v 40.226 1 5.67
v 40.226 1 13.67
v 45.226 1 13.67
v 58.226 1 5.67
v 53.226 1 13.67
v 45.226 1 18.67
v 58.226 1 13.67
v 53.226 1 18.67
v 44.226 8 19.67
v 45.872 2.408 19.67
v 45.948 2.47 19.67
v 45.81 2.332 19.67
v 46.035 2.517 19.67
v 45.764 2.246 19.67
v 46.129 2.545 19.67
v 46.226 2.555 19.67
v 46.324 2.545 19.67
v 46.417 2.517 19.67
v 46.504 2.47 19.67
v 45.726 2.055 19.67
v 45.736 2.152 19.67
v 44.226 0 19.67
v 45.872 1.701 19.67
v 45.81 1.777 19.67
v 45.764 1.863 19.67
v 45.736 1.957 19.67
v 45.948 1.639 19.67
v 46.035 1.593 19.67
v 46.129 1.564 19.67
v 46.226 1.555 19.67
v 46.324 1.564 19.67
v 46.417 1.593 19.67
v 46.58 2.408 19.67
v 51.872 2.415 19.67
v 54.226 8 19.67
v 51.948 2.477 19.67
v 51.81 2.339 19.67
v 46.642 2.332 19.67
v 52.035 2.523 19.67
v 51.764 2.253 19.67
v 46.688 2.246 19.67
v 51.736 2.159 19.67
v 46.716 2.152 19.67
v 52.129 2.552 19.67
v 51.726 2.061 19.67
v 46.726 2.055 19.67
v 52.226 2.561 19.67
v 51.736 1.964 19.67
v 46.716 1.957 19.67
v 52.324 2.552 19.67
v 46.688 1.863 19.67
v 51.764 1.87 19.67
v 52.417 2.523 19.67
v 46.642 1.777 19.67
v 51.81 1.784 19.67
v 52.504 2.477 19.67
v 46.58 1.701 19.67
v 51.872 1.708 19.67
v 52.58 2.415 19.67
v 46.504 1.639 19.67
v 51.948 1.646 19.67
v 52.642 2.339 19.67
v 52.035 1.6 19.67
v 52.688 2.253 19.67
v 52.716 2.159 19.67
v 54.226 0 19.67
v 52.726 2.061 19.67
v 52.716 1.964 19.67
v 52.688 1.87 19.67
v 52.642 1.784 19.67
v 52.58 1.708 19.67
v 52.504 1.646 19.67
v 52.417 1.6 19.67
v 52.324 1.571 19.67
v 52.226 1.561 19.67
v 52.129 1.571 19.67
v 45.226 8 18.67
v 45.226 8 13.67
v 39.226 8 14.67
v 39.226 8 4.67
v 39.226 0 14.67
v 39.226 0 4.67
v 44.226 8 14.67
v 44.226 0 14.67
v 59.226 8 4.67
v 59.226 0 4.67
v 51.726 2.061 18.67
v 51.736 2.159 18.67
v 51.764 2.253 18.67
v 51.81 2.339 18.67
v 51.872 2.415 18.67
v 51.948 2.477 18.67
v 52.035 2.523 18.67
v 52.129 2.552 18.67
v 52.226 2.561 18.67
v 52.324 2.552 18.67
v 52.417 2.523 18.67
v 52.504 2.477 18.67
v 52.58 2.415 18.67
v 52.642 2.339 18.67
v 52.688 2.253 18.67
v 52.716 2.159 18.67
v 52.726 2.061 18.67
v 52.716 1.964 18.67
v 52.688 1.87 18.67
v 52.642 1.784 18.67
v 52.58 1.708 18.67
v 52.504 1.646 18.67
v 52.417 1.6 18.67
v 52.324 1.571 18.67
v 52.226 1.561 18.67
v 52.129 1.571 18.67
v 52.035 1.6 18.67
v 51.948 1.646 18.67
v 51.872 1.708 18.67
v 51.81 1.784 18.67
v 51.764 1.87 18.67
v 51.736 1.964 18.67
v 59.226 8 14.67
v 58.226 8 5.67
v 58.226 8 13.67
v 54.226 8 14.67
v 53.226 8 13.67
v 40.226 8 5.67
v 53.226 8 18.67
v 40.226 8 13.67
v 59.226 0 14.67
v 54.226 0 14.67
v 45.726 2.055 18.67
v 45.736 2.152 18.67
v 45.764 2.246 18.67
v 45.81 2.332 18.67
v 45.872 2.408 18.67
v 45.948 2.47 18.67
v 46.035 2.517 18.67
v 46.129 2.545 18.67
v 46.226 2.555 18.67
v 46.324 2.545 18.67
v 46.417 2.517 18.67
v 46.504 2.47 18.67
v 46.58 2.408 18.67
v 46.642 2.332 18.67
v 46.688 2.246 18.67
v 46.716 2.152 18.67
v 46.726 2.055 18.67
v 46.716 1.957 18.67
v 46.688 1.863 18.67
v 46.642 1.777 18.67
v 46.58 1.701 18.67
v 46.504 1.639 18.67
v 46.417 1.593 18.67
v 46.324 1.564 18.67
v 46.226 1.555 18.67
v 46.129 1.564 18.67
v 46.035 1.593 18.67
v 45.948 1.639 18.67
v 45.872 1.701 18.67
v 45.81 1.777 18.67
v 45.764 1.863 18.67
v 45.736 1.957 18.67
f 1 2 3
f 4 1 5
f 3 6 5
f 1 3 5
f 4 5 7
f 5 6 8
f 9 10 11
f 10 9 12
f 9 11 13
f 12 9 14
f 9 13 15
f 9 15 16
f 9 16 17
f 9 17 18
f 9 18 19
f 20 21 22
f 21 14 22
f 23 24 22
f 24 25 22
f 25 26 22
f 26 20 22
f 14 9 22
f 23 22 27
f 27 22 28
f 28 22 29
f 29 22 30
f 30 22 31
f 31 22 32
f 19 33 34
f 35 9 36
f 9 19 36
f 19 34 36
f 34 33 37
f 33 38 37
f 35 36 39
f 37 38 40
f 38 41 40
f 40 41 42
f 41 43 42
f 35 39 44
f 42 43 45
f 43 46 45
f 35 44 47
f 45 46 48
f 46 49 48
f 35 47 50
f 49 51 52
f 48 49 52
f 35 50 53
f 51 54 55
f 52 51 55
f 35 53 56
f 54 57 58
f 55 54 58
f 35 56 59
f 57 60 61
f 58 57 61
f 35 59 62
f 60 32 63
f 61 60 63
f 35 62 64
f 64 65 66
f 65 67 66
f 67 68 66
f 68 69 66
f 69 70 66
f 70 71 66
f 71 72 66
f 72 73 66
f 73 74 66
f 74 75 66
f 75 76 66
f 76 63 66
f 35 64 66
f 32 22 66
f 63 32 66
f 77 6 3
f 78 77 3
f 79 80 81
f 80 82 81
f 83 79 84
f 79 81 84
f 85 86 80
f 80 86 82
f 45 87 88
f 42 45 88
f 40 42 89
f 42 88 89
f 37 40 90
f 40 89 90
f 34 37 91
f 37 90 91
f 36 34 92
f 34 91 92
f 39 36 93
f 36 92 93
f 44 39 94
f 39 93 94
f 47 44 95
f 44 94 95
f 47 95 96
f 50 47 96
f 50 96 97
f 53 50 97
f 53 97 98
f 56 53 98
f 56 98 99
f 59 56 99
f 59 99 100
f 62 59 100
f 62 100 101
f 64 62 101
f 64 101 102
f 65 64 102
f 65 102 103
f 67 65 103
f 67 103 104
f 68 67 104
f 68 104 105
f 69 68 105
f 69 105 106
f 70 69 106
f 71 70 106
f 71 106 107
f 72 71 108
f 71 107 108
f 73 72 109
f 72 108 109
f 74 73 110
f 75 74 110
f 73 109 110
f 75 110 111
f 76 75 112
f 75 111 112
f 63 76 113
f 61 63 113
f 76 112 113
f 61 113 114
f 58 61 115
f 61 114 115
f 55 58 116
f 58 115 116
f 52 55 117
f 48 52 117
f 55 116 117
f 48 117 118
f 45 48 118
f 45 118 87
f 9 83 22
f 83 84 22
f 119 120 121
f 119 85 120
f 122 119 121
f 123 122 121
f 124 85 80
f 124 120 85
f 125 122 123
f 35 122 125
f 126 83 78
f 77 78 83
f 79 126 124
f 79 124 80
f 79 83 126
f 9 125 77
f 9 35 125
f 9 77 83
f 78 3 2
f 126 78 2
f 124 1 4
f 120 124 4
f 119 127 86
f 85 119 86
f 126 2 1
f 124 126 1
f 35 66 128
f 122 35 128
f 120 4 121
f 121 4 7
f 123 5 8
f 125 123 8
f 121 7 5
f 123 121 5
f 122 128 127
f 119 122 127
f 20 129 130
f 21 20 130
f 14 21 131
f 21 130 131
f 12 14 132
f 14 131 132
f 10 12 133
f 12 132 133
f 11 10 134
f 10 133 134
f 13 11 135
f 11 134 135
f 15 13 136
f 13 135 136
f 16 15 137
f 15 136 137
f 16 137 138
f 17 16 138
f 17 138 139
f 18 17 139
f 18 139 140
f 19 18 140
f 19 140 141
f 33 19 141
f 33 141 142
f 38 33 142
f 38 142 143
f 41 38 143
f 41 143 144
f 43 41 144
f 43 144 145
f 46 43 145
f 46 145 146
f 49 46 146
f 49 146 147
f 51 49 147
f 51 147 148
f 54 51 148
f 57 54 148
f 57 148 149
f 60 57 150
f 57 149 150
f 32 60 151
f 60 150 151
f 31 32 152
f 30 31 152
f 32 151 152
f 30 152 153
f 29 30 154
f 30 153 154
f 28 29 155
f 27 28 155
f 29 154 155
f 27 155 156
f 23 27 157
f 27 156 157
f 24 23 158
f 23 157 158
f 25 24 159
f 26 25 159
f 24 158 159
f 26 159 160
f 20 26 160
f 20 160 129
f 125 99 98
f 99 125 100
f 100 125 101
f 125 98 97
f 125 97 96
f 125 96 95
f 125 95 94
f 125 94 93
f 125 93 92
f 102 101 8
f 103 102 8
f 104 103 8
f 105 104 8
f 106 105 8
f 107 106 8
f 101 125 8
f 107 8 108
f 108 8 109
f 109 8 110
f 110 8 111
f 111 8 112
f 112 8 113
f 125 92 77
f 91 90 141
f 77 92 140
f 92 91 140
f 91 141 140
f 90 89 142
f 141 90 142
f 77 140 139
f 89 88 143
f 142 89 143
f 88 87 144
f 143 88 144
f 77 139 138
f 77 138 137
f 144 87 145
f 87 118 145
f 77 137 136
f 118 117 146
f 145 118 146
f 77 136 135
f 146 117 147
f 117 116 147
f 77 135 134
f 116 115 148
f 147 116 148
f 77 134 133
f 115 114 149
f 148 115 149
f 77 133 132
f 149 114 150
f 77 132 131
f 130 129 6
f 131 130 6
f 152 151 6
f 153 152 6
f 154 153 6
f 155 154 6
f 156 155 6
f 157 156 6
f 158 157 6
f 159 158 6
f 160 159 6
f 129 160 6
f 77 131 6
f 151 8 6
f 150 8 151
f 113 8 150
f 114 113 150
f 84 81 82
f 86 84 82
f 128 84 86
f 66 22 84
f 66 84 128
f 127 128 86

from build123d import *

# Parameters (mm, degrees)
F0_W     = 10
F0_H     = 5
F1_DEPTH = 1
F3_DEPTH = 7
F5_D     = 1
F5_DEPTH = 1


with BuildPart() as f1:
    # F0 (on Front) → F1 (new body)
    with BuildSketch(Plane.XZ):
        with Locations((49.226046, 17.170396)):
            Rectangle(F0_W, F0_H)
        Polygon((39.226046, 4.670396), (59.226046, 4.670396), (59.226046, 14.670396), (54.226046, 14.670396), (44.226046, 14.670396), (39.226046, 14.670396), align=None)
    extrude(amount=-F1_DEPTH)

    # F2 (on face) → F3 (join)
    with BuildSketch(Plane(origin=(0, 1, 0), x_dir=(-1, 0, 0), z_dir=(0, 1, 0))):
        Polygon((-59.226046, 14.670396), (-59.226046, 4.670396), (-39.226046, 4.670396), (-39.226046, 14.670396), (-44.226046, 14.670396), (-44.226046, 19.670396), (-54.226046, 19.670396), (-54.226046, 14.670396), align=None)
        Polygon((-58.226046, 5.670396), (-58.226046, 13.670396), (-53.226046, 13.670396), (-53.226046, 18.670396), (-45.226046, 18.670396), (-45.226046, 13.670396), (-40.226046, 13.670396), (-40.226046, 5.670396), align=None, mode=Mode.SUBTRACT)
    extrude(amount=F3_DEPTH)

    # F5
    with Locations(Plane.XY.offset(19.670396)):
        with Locations((46.226046, 2.054661), (52.226046, 2.061454)):
            Hole(F5_D / 2, depth=F5_DEPTH)


solid = f1.part
